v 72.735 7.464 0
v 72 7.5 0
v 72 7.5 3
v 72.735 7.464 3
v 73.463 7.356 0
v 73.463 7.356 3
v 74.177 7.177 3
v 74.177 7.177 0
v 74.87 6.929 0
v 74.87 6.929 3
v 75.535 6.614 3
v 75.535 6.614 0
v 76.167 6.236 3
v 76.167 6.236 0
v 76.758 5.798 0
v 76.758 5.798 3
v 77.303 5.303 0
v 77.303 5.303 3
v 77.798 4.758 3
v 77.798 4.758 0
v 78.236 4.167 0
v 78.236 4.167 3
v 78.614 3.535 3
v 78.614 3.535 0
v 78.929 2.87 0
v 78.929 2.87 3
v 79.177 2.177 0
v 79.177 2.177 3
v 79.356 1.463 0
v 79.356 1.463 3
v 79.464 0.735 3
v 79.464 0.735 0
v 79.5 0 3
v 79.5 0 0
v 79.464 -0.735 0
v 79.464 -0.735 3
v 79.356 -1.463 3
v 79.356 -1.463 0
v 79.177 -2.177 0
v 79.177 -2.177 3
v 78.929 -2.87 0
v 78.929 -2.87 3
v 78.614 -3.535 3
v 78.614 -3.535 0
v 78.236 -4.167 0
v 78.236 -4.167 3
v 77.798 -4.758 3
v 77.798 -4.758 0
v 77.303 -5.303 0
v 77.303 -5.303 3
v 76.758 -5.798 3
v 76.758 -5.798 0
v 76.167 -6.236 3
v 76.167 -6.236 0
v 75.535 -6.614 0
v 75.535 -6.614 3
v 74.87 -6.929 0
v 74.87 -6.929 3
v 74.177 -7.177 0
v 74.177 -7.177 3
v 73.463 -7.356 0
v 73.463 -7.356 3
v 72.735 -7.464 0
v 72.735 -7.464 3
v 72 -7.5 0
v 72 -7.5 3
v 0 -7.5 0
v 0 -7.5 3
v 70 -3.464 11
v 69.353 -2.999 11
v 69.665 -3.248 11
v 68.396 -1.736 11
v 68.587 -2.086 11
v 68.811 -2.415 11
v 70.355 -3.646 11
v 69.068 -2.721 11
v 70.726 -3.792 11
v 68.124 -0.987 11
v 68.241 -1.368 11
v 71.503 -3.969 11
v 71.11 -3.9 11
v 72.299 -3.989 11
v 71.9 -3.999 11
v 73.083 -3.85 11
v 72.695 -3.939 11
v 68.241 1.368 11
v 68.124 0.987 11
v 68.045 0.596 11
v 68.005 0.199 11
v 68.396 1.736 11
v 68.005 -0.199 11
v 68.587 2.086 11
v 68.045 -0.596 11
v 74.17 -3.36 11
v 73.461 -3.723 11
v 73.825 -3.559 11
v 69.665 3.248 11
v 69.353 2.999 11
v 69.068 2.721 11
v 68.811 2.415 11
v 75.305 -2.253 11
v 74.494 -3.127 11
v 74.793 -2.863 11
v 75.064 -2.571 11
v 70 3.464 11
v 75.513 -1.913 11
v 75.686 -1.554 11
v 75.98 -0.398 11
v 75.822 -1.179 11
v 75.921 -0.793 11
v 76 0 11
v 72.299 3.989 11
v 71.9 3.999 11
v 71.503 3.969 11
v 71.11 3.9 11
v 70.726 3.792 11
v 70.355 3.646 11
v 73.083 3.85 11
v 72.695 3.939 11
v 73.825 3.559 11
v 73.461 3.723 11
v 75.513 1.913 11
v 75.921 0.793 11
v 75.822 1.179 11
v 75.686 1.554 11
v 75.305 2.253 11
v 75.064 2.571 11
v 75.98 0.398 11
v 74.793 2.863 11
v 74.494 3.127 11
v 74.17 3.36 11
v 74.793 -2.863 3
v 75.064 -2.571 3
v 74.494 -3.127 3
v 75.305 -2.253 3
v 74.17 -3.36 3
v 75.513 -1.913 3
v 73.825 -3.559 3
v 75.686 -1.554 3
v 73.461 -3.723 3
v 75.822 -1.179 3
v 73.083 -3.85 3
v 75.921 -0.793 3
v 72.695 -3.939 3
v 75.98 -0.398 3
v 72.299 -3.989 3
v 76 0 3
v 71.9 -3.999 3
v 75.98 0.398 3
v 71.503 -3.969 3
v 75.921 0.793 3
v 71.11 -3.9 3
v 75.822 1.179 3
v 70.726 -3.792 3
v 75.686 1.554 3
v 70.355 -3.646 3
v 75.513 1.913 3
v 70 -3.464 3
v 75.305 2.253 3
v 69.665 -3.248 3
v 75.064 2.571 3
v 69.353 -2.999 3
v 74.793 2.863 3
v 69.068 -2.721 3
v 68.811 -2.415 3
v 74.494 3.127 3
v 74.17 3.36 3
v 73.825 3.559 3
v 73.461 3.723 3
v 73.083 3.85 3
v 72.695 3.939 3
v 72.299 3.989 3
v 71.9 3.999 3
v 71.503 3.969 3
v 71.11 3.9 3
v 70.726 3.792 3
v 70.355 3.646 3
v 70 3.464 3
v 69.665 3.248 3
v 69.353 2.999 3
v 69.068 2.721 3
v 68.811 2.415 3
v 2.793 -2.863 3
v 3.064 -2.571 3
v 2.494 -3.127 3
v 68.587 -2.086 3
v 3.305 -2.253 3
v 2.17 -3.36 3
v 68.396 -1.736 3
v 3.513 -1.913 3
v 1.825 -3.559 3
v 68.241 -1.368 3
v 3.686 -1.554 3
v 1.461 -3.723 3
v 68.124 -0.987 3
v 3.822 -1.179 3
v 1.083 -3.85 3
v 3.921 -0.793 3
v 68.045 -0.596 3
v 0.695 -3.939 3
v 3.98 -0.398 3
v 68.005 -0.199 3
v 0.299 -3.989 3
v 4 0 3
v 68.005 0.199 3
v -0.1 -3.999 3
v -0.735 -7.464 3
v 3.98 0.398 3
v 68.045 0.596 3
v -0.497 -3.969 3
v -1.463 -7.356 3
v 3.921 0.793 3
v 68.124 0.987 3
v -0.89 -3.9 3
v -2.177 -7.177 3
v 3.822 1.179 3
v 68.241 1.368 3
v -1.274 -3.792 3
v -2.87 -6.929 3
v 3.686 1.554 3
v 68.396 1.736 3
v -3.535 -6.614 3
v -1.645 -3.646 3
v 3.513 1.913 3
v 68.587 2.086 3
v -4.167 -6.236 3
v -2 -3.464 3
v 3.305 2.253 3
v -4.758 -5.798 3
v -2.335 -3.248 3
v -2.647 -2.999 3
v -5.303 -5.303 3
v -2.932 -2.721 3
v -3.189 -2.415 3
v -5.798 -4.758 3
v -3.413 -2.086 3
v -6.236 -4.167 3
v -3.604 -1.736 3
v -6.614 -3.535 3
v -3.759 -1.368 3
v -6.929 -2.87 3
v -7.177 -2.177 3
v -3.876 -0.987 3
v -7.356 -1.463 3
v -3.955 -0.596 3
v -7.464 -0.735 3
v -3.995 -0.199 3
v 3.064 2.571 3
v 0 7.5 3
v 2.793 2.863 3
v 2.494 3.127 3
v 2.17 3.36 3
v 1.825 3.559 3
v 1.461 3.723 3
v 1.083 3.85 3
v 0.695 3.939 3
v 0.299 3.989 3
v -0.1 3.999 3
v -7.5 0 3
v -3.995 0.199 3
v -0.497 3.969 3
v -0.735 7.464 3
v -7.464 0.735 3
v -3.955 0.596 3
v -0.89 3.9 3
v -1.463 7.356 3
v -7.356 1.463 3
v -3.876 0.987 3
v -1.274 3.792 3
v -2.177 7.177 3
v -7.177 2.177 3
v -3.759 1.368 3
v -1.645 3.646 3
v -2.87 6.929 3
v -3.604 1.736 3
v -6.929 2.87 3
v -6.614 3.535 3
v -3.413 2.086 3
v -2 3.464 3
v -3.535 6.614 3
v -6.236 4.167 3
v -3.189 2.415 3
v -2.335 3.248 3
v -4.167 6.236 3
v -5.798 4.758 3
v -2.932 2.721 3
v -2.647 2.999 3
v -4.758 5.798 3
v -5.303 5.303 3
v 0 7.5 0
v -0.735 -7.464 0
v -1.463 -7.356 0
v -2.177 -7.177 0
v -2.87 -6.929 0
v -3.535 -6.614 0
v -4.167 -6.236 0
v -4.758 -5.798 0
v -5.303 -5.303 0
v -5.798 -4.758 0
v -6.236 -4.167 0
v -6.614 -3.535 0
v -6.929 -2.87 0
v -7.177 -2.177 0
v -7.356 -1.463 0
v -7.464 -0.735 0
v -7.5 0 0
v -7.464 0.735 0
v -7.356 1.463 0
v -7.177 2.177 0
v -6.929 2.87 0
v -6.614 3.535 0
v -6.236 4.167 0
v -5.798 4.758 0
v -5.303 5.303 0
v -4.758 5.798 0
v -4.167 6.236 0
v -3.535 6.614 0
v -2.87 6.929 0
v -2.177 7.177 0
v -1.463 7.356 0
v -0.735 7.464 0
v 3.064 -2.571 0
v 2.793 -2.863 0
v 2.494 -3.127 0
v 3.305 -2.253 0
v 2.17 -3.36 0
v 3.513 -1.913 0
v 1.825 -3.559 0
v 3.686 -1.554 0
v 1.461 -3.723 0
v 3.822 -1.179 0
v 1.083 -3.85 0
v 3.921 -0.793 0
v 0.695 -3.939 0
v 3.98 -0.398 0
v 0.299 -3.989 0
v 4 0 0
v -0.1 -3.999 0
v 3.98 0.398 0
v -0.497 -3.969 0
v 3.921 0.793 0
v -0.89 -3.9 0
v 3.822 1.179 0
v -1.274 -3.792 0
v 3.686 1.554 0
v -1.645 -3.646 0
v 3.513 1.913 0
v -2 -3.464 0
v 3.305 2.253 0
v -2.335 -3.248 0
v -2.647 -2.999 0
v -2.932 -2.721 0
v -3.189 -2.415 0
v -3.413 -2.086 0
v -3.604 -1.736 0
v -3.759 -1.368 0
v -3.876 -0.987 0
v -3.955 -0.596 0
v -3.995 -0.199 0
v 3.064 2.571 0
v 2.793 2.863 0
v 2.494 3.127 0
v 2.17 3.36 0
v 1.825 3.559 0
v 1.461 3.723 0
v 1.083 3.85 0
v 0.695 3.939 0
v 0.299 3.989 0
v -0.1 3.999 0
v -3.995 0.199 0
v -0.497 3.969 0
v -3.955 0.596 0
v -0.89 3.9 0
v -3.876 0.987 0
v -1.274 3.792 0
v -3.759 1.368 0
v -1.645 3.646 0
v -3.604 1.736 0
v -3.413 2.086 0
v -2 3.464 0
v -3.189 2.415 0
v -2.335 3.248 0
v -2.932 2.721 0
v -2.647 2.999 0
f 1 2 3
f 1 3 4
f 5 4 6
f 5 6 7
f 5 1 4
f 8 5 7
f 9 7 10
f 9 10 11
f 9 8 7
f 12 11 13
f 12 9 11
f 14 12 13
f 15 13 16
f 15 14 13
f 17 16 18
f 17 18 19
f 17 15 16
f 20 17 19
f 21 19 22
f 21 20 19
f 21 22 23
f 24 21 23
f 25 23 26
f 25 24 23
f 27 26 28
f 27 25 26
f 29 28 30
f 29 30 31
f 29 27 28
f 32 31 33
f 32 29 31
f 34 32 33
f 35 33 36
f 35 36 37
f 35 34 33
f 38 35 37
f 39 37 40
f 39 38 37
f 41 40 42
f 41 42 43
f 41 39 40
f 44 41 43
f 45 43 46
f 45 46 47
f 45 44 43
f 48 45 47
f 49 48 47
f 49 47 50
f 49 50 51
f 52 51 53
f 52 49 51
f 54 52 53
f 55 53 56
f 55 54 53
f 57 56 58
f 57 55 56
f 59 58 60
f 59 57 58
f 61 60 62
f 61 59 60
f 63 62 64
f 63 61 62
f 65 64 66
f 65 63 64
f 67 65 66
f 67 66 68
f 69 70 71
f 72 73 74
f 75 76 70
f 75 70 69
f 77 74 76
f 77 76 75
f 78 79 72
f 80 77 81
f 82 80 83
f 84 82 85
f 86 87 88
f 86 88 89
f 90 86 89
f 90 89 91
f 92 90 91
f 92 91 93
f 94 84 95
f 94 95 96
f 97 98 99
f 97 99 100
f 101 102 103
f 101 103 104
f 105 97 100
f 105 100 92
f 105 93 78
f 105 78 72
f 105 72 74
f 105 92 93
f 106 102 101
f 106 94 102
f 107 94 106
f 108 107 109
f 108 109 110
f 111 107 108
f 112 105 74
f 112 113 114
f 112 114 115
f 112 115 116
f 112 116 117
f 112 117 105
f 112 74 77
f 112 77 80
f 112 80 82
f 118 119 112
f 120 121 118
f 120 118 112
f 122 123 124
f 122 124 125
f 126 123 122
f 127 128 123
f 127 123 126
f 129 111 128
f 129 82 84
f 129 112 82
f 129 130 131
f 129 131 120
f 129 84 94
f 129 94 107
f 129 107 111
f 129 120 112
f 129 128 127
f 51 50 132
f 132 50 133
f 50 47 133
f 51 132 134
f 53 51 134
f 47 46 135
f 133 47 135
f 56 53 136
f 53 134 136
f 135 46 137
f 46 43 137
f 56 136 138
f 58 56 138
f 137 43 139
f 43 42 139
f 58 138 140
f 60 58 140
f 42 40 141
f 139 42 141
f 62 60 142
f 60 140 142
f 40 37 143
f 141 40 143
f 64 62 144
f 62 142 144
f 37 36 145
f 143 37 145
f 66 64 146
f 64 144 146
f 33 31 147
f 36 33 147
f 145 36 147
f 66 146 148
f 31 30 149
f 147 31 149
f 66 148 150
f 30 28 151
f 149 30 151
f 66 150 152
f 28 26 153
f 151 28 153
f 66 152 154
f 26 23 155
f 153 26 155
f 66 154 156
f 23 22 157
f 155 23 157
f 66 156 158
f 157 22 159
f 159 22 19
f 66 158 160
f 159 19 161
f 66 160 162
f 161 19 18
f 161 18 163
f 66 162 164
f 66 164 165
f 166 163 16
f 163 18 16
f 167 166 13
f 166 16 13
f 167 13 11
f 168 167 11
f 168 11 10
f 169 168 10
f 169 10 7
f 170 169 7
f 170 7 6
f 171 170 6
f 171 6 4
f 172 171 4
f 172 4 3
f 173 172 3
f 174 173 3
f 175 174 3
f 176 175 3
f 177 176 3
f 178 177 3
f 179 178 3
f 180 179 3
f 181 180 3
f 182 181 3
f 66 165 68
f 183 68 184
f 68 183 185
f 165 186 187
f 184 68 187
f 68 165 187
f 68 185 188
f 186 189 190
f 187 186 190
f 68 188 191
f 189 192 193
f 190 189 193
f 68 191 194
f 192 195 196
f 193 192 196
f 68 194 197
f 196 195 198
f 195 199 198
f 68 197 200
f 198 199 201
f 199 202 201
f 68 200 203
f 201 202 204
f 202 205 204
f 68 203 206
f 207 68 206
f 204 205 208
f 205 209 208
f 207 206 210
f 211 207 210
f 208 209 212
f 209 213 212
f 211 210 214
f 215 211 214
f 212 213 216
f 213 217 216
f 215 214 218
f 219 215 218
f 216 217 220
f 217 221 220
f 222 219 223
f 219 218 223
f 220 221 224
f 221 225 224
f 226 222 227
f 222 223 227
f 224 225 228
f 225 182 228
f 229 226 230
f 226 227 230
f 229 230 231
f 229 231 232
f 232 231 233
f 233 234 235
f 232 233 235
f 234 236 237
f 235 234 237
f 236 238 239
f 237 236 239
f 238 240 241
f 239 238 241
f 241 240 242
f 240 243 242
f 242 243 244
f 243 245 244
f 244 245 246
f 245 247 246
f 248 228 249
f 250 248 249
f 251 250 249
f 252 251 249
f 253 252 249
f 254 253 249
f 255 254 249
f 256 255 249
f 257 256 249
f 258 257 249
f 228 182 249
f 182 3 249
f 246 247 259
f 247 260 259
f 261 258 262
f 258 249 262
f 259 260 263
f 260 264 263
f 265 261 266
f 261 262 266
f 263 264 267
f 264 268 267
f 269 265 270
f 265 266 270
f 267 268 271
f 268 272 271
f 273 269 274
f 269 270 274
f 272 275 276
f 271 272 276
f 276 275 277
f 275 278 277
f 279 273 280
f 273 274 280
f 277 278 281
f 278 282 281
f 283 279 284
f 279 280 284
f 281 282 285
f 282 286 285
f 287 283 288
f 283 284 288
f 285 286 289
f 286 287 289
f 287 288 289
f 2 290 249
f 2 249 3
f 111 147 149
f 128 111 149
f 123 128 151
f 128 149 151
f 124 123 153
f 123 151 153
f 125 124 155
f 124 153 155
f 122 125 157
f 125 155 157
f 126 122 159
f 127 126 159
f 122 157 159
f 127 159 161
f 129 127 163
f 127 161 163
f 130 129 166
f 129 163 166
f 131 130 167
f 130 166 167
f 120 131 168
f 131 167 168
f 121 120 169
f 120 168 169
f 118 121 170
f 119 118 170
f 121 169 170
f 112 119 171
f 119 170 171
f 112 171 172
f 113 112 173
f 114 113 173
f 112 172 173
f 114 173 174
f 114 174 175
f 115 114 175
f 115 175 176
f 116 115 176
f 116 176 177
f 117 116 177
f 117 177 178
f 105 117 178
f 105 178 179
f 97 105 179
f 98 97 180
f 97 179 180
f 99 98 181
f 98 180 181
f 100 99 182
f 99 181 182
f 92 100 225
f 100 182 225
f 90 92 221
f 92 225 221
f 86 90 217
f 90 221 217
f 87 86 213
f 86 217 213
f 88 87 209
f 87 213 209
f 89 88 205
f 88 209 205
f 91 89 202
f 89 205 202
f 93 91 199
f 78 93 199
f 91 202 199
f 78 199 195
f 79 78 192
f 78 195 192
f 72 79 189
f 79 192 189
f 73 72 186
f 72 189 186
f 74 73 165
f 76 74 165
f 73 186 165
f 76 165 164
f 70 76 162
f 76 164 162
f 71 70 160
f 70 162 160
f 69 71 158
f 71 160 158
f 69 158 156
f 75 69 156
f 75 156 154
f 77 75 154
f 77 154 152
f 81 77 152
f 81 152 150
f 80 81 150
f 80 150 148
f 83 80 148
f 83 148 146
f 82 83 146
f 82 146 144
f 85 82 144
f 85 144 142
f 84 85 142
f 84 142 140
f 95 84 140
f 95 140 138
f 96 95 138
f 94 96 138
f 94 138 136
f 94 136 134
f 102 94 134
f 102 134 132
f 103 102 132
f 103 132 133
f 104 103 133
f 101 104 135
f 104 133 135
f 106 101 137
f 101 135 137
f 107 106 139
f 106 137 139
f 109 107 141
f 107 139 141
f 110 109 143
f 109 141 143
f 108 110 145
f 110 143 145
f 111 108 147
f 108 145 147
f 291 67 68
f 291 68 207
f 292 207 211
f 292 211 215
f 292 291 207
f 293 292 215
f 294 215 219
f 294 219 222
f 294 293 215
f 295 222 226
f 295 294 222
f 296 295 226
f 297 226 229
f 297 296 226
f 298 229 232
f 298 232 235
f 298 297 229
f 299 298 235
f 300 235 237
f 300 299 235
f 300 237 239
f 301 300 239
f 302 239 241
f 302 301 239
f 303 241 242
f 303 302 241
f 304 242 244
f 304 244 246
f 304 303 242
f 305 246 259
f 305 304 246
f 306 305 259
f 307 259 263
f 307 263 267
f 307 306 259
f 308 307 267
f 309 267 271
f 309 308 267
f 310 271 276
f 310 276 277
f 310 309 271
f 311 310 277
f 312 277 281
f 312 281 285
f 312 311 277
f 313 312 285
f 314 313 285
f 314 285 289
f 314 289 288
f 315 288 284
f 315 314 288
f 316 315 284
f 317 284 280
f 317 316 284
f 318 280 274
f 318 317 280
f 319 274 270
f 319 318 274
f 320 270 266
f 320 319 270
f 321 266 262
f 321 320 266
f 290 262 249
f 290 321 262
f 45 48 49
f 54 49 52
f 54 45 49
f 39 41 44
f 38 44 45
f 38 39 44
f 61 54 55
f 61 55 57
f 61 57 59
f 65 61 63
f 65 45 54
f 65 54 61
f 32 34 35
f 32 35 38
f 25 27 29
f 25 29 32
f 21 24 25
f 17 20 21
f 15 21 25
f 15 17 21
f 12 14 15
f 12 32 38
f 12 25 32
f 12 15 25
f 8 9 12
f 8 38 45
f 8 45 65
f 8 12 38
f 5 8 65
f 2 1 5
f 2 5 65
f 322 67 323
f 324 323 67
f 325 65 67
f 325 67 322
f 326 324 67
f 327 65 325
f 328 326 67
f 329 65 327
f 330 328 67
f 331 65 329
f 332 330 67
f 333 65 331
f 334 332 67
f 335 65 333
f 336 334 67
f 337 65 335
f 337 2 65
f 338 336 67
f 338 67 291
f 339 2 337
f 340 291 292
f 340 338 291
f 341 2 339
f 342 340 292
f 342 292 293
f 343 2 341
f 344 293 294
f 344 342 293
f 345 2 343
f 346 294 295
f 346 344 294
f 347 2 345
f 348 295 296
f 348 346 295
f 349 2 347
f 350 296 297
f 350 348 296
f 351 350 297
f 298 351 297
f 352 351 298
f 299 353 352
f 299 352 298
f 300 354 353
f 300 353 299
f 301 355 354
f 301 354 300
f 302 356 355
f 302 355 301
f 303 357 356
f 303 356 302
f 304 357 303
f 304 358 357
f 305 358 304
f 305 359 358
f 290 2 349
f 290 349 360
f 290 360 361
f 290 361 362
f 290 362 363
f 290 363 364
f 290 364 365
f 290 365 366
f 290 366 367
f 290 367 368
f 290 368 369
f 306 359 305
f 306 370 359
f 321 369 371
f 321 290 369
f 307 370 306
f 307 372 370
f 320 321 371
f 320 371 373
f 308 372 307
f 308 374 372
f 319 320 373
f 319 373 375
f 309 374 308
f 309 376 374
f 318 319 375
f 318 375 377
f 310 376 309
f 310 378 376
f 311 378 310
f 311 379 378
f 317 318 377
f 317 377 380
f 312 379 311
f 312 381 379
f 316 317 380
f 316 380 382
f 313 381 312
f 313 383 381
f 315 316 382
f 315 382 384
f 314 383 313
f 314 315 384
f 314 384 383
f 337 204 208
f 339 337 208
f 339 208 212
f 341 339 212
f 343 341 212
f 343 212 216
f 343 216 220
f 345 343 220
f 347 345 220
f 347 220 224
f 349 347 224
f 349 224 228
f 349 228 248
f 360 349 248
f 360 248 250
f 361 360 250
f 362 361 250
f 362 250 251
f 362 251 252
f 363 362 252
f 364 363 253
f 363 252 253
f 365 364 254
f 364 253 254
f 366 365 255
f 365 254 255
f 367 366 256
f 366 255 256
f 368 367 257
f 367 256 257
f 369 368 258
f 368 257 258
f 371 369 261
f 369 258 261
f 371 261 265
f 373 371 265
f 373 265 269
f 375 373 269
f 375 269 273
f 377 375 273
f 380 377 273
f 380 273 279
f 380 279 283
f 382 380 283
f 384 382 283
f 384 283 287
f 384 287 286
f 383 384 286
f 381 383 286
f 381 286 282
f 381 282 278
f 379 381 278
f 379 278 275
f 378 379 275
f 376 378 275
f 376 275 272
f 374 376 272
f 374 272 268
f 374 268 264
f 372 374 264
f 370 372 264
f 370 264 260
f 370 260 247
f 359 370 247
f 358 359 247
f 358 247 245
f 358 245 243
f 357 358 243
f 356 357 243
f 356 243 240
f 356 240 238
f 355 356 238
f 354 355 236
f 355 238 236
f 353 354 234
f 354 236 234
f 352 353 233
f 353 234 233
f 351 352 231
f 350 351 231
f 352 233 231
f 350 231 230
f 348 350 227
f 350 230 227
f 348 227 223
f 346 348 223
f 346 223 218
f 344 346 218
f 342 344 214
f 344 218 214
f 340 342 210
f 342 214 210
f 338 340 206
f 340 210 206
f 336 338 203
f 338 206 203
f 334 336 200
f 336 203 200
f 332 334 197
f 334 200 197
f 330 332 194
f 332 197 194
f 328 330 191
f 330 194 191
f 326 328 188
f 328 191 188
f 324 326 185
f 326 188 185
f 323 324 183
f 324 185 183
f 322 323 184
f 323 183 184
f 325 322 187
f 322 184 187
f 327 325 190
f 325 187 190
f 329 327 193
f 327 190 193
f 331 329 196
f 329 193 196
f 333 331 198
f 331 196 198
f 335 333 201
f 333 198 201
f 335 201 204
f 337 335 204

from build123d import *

# Parameters (mm, degrees)
BOSS_EXTRUDE4_DEPTH = 3
SKETCH4_R           = 4
CUT_EXTRUDE1_DEPTH  = 80.909323611
SKETCH5_R           = 4
BOSS_EXTRUDE5_DEPTH = 8


with BuildPart() as part:
    # Sketch1 → Boss-Extrude4 (new body)
    with BuildSketch(Plane.XY):
        with BuildLine():
            Line((0, 7.5), (72, 7.5))
            ThreePointArc((72, 7.5), (79.5, 0), (72, -7.5))
            Line((72, -7.5), (0, -7.5))
            ThreePointArc((0, -7.5), (-7.5, 0), (0, 7.5))
        make_face()
    extrude(amount=BOSS_EXTRUDE4_DEPTH)

    # Sketch4 → Cut-Extrude1 (cut, through all)
    with BuildSketch(Plane.XY.offset(3)):
        Circle(SKETCH4_R)
    extrude(amount=-CUT_EXTRUDE1_DEPTH, mode=Mode.SUBTRACT)

    # Sketch5 → Boss-Extrude5 (add)
    with BuildSketch(Plane.XY.offset(3)):
        with Locations((72, 0)):
            Circle(SKETCH5_R)
    extrude(amount=BOSS_EXTRUDE5_DEPTH)


solid = part.part
